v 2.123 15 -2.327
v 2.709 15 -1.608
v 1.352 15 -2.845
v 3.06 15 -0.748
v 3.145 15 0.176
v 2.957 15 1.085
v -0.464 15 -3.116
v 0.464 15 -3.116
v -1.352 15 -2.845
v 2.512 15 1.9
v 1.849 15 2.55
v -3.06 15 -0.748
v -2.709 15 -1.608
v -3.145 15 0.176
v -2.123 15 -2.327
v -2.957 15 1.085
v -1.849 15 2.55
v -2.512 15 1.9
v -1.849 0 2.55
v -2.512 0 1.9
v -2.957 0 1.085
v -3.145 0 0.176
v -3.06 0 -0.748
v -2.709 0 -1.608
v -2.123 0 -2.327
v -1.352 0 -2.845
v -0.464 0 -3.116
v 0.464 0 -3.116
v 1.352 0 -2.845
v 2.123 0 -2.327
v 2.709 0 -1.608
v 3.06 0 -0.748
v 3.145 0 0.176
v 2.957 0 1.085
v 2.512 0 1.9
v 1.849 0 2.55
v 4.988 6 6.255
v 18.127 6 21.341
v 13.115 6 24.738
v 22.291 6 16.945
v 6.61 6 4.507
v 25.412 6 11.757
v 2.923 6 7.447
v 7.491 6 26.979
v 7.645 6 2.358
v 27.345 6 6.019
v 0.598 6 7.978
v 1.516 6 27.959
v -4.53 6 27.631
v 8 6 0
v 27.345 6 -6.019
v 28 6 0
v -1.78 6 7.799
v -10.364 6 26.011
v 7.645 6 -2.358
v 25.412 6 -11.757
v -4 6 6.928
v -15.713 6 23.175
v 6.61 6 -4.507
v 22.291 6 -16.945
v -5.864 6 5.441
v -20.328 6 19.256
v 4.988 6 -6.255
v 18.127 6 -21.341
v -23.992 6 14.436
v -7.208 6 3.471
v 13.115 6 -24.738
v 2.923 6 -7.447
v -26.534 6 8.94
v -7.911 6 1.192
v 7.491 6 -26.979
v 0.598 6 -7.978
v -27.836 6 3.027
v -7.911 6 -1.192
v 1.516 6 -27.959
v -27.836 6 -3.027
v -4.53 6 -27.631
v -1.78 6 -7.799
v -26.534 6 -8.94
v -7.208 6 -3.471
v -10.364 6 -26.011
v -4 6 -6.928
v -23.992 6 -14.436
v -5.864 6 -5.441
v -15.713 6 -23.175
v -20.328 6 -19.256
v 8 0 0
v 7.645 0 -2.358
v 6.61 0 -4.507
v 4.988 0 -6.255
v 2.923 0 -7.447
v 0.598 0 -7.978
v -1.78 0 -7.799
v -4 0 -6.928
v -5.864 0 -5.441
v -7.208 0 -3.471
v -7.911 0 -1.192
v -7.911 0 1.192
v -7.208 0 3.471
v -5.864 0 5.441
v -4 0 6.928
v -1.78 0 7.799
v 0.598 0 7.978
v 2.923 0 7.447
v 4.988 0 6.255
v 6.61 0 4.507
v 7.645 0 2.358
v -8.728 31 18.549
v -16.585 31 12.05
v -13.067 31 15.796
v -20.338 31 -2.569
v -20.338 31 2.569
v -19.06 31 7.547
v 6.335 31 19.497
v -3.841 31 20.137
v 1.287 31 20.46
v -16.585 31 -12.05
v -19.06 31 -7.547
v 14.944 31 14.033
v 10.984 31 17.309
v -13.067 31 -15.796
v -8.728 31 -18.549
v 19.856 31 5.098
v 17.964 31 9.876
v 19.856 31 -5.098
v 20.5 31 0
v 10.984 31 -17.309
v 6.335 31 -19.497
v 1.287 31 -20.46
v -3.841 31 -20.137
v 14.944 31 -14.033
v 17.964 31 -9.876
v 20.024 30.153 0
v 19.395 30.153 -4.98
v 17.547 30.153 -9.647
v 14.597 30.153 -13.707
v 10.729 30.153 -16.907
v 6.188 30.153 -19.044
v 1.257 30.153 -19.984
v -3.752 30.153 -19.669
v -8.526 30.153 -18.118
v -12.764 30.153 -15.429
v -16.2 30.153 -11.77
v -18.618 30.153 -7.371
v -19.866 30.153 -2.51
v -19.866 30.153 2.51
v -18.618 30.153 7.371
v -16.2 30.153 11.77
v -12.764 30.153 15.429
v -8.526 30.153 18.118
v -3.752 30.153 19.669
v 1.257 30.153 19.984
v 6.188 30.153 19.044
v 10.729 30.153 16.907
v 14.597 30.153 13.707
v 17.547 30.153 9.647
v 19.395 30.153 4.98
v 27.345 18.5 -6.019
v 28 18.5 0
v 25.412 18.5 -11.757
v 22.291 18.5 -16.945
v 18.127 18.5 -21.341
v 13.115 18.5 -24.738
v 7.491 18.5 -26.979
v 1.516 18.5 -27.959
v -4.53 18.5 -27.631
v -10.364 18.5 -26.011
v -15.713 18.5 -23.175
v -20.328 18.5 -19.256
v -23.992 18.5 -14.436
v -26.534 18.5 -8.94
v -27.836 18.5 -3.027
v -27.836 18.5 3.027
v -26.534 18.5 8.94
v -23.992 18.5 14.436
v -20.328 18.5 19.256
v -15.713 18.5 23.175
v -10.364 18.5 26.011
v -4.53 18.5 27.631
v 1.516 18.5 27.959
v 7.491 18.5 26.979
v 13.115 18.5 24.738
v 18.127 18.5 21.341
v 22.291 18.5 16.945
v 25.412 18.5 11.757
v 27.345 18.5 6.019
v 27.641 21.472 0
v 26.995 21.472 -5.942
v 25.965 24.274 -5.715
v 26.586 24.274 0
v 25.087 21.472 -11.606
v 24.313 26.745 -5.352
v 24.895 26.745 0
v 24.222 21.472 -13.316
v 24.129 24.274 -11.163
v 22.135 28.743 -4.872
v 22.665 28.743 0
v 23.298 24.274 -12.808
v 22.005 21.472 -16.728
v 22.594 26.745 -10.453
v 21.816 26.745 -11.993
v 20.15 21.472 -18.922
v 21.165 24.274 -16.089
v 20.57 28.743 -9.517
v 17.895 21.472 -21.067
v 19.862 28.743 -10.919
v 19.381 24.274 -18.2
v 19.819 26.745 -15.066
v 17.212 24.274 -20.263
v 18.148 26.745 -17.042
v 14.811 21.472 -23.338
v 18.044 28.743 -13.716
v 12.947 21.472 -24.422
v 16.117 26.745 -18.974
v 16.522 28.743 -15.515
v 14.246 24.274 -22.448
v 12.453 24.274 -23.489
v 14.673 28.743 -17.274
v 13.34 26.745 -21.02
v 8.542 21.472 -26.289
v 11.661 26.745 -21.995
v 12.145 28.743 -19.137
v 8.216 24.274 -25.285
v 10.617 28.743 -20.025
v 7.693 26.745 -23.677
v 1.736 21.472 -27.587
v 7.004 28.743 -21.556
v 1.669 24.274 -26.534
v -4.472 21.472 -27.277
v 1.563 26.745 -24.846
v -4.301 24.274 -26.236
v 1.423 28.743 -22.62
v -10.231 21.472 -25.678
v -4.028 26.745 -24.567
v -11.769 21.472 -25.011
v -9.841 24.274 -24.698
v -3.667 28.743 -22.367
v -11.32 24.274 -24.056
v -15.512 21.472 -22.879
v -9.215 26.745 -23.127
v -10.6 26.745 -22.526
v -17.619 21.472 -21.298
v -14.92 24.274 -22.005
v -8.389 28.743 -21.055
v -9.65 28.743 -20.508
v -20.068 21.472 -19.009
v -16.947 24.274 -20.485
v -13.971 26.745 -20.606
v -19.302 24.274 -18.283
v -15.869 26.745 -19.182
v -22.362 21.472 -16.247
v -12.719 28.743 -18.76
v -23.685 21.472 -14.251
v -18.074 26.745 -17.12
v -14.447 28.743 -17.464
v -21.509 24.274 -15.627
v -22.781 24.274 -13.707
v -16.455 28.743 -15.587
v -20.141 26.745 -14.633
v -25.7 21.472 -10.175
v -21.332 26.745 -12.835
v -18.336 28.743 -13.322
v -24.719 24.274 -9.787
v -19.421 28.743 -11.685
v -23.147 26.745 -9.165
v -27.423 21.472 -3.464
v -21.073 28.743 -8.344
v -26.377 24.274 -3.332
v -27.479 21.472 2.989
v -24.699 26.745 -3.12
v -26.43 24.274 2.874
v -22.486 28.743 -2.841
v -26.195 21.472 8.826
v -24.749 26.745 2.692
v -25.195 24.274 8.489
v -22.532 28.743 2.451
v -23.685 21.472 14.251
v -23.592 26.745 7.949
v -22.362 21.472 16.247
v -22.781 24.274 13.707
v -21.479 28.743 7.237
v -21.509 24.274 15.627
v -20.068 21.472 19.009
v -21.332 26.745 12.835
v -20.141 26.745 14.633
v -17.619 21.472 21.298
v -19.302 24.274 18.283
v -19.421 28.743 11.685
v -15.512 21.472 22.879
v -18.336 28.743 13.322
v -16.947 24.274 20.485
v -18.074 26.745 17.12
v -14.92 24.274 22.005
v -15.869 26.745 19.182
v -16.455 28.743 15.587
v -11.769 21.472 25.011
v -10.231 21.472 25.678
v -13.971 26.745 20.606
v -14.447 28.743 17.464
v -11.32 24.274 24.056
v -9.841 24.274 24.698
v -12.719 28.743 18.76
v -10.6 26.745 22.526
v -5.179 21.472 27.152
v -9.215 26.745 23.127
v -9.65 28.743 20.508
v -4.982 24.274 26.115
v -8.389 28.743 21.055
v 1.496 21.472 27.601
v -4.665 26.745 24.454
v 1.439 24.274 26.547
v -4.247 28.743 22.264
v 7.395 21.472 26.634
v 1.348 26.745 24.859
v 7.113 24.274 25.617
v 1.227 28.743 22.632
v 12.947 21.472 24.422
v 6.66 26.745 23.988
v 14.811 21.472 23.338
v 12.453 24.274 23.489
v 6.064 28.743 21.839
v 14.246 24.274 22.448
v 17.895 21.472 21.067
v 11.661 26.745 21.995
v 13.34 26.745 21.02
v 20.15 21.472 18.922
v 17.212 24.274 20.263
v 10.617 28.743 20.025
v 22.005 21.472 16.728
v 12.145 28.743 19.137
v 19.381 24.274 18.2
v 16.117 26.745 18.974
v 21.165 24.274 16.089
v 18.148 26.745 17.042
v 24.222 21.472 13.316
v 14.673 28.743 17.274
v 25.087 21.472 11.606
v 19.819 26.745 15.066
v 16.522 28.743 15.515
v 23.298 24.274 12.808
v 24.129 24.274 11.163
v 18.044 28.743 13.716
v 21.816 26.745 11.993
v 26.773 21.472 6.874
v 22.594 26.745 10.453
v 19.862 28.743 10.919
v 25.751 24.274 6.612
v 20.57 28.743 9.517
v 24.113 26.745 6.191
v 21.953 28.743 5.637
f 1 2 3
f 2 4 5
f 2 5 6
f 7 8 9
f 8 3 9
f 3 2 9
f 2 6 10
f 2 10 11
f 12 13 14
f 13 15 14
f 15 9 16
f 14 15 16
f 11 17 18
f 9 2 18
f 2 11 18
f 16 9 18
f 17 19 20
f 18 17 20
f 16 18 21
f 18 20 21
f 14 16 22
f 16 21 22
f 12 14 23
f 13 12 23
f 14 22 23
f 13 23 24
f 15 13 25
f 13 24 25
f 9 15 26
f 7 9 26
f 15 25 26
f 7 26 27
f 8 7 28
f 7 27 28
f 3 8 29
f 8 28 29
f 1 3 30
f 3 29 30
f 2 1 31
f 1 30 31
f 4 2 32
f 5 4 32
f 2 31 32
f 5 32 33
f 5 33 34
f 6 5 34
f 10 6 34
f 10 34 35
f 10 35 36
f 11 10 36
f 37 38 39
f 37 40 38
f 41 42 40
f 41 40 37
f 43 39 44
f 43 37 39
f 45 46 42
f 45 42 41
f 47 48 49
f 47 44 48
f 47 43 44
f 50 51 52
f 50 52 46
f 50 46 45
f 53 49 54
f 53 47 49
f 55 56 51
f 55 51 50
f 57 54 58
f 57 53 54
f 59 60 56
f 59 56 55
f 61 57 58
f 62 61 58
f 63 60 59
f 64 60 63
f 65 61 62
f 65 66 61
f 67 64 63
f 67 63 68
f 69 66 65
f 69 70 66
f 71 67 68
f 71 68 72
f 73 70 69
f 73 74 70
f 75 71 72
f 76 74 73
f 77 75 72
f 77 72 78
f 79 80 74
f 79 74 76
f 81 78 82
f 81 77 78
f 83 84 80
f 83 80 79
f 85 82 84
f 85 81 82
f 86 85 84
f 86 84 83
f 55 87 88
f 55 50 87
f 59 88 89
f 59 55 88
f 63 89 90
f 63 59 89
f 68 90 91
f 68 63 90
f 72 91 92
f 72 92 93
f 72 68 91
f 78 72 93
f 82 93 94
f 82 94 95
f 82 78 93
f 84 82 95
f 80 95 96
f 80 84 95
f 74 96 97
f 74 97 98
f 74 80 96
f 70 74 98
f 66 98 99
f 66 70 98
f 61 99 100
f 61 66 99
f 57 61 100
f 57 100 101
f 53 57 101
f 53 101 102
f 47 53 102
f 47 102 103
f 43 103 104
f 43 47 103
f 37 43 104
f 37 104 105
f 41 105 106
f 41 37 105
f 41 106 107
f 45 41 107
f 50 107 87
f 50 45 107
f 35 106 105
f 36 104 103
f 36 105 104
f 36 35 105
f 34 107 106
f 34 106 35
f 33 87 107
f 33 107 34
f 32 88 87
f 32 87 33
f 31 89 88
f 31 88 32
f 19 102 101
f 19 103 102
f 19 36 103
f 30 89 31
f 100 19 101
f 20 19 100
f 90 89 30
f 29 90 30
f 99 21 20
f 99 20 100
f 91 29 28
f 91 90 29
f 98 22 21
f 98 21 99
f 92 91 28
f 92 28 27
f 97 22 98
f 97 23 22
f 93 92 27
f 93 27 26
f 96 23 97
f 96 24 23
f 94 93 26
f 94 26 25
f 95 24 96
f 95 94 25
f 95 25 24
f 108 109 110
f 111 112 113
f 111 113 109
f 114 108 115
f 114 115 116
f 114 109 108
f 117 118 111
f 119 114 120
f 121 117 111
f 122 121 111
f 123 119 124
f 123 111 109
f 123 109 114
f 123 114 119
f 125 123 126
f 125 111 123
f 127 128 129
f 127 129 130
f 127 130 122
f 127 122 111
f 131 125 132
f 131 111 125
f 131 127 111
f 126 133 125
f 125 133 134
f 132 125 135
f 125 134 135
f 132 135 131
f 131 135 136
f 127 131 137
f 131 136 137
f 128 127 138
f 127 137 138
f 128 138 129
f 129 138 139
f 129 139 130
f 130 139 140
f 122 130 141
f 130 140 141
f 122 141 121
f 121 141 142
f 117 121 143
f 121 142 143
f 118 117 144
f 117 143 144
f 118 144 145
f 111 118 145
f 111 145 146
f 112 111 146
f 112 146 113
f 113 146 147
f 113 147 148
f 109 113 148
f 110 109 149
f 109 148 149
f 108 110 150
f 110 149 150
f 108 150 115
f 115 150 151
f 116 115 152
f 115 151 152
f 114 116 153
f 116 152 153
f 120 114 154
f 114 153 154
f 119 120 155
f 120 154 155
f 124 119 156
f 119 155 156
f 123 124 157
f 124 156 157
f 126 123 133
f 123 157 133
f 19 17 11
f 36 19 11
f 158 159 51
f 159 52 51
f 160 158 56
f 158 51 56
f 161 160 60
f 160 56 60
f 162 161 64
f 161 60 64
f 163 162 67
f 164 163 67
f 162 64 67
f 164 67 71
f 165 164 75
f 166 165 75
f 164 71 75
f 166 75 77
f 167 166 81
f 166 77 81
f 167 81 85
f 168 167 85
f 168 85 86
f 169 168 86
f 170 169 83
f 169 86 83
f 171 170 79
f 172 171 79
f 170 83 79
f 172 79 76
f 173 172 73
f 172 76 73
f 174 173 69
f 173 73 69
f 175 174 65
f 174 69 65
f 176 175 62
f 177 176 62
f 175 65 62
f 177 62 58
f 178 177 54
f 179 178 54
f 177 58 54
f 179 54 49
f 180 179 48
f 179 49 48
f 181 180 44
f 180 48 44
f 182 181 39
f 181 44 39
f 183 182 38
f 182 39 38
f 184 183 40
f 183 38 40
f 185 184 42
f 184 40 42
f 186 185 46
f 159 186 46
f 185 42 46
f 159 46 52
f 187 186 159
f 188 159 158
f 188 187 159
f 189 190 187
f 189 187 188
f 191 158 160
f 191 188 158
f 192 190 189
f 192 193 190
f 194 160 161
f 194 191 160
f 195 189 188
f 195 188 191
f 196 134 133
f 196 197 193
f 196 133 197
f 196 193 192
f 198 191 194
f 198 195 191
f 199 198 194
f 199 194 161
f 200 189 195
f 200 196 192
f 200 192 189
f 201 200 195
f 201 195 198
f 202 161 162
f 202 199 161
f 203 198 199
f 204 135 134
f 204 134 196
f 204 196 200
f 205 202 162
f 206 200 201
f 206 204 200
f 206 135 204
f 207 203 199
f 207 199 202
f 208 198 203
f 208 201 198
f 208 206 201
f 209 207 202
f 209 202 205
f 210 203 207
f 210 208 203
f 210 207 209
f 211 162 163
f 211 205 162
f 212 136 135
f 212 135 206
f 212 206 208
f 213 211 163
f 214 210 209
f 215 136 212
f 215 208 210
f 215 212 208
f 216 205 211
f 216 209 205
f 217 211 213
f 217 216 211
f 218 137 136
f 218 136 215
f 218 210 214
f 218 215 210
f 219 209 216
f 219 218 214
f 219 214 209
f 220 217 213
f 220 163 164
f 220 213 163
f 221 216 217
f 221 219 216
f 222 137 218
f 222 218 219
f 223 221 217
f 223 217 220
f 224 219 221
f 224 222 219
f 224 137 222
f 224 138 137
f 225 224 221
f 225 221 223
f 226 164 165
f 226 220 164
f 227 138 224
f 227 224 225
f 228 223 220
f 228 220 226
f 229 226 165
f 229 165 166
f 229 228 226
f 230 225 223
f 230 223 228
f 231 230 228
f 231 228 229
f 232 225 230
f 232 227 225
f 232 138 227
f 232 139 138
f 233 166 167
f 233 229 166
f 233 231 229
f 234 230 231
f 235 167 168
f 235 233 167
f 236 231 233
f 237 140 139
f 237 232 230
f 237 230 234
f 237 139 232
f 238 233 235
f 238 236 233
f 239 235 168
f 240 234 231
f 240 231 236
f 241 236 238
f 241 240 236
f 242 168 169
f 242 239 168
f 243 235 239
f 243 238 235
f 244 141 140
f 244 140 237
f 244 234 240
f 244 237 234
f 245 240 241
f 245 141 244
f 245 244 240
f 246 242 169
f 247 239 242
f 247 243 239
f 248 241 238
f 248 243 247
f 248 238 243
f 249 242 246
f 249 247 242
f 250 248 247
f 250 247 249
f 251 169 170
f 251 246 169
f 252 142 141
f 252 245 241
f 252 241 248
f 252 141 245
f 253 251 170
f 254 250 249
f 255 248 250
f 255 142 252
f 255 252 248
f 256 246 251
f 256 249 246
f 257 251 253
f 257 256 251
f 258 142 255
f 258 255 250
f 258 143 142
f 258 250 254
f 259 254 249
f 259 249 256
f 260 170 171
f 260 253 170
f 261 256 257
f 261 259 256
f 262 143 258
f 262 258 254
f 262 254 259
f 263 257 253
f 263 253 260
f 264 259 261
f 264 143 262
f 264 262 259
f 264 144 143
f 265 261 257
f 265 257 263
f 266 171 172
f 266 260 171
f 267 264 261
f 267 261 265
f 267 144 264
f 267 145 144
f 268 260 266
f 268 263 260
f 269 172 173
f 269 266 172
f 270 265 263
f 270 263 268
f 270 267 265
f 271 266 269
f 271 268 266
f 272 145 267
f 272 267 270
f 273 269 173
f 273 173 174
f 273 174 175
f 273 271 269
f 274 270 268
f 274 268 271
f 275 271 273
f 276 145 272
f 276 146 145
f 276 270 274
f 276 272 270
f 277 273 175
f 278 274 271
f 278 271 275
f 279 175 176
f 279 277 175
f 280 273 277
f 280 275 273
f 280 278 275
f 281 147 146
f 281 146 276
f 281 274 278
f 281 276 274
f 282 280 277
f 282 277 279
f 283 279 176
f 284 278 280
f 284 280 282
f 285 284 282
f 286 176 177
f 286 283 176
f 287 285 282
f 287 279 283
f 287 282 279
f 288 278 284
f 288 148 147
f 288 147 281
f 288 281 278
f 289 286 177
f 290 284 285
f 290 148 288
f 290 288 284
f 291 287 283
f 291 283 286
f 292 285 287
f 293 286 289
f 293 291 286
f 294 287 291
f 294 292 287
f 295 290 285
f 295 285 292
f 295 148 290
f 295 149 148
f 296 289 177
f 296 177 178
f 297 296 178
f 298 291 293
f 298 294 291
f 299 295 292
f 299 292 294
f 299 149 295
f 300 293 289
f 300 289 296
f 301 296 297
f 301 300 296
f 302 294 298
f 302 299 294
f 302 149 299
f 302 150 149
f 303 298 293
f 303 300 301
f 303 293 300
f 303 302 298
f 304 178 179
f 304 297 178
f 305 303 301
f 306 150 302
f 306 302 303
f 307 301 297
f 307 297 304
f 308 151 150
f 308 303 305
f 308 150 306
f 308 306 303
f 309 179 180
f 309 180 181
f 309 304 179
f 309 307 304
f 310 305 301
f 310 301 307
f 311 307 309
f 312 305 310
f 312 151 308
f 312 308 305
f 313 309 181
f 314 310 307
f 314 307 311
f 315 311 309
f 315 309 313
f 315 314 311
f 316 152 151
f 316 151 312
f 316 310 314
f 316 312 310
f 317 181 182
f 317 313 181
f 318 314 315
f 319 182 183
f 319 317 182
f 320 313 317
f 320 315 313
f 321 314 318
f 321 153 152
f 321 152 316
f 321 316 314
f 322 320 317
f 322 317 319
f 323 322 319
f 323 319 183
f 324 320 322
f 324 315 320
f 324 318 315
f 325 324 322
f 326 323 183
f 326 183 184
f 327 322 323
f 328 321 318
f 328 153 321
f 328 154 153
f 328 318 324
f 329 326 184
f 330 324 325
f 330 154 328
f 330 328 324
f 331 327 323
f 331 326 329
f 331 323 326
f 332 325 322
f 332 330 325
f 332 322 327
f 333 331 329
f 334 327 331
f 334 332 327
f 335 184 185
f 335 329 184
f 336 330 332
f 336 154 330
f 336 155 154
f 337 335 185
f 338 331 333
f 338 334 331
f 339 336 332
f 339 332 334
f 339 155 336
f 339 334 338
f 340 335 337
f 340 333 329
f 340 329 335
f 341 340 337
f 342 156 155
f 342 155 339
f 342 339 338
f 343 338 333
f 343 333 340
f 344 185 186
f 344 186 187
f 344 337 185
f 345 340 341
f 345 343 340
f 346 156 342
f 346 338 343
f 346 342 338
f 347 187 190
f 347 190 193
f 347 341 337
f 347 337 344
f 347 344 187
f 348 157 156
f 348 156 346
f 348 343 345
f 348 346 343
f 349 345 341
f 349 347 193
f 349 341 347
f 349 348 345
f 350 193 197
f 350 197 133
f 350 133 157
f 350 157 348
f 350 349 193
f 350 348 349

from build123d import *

# Parameters (mm, degrees)
POCKET_DEPTH = 15


with BuildPart() as part:
    # Sketch → Revolution (revolve)
    with BuildSketch(Plane.XY):
        with BuildLine():
            Line((15.5, 31), (0, 31))
            Line((0, 31), (0, 0))
            Line((0, 0), (8, 0))
            Line((8, 0), (8, 6))
            Line((8, 6), (28, 6))
            Line((28, 18.5), (28, 6))
            ThreePointArc((28, 18.5), (25.815026, 25.56047), (20.023961, 30.15263))
            Line((20.5, 31), (20.023961, 30.15263))
            Line((15.5, 31), (20.5, 31))
        make_face()
    revolve(axis=Axis((0, 0, 0), (0, 1, 0)))

    # Sketch001 → Pocket (cut)
    with BuildSketch(Plane.XZ):
        with BuildLine():
            Line((-1.849324, 2.55), (1.849324, 2.55))
            ThreePointArc((-1.849324, 2.55), (0, -3.15), (1.849324, 2.55))
        make_face()
    extrude(amount=-POCKET_DEPTH, mode=Mode.SUBTRACT)


solid = part.part
